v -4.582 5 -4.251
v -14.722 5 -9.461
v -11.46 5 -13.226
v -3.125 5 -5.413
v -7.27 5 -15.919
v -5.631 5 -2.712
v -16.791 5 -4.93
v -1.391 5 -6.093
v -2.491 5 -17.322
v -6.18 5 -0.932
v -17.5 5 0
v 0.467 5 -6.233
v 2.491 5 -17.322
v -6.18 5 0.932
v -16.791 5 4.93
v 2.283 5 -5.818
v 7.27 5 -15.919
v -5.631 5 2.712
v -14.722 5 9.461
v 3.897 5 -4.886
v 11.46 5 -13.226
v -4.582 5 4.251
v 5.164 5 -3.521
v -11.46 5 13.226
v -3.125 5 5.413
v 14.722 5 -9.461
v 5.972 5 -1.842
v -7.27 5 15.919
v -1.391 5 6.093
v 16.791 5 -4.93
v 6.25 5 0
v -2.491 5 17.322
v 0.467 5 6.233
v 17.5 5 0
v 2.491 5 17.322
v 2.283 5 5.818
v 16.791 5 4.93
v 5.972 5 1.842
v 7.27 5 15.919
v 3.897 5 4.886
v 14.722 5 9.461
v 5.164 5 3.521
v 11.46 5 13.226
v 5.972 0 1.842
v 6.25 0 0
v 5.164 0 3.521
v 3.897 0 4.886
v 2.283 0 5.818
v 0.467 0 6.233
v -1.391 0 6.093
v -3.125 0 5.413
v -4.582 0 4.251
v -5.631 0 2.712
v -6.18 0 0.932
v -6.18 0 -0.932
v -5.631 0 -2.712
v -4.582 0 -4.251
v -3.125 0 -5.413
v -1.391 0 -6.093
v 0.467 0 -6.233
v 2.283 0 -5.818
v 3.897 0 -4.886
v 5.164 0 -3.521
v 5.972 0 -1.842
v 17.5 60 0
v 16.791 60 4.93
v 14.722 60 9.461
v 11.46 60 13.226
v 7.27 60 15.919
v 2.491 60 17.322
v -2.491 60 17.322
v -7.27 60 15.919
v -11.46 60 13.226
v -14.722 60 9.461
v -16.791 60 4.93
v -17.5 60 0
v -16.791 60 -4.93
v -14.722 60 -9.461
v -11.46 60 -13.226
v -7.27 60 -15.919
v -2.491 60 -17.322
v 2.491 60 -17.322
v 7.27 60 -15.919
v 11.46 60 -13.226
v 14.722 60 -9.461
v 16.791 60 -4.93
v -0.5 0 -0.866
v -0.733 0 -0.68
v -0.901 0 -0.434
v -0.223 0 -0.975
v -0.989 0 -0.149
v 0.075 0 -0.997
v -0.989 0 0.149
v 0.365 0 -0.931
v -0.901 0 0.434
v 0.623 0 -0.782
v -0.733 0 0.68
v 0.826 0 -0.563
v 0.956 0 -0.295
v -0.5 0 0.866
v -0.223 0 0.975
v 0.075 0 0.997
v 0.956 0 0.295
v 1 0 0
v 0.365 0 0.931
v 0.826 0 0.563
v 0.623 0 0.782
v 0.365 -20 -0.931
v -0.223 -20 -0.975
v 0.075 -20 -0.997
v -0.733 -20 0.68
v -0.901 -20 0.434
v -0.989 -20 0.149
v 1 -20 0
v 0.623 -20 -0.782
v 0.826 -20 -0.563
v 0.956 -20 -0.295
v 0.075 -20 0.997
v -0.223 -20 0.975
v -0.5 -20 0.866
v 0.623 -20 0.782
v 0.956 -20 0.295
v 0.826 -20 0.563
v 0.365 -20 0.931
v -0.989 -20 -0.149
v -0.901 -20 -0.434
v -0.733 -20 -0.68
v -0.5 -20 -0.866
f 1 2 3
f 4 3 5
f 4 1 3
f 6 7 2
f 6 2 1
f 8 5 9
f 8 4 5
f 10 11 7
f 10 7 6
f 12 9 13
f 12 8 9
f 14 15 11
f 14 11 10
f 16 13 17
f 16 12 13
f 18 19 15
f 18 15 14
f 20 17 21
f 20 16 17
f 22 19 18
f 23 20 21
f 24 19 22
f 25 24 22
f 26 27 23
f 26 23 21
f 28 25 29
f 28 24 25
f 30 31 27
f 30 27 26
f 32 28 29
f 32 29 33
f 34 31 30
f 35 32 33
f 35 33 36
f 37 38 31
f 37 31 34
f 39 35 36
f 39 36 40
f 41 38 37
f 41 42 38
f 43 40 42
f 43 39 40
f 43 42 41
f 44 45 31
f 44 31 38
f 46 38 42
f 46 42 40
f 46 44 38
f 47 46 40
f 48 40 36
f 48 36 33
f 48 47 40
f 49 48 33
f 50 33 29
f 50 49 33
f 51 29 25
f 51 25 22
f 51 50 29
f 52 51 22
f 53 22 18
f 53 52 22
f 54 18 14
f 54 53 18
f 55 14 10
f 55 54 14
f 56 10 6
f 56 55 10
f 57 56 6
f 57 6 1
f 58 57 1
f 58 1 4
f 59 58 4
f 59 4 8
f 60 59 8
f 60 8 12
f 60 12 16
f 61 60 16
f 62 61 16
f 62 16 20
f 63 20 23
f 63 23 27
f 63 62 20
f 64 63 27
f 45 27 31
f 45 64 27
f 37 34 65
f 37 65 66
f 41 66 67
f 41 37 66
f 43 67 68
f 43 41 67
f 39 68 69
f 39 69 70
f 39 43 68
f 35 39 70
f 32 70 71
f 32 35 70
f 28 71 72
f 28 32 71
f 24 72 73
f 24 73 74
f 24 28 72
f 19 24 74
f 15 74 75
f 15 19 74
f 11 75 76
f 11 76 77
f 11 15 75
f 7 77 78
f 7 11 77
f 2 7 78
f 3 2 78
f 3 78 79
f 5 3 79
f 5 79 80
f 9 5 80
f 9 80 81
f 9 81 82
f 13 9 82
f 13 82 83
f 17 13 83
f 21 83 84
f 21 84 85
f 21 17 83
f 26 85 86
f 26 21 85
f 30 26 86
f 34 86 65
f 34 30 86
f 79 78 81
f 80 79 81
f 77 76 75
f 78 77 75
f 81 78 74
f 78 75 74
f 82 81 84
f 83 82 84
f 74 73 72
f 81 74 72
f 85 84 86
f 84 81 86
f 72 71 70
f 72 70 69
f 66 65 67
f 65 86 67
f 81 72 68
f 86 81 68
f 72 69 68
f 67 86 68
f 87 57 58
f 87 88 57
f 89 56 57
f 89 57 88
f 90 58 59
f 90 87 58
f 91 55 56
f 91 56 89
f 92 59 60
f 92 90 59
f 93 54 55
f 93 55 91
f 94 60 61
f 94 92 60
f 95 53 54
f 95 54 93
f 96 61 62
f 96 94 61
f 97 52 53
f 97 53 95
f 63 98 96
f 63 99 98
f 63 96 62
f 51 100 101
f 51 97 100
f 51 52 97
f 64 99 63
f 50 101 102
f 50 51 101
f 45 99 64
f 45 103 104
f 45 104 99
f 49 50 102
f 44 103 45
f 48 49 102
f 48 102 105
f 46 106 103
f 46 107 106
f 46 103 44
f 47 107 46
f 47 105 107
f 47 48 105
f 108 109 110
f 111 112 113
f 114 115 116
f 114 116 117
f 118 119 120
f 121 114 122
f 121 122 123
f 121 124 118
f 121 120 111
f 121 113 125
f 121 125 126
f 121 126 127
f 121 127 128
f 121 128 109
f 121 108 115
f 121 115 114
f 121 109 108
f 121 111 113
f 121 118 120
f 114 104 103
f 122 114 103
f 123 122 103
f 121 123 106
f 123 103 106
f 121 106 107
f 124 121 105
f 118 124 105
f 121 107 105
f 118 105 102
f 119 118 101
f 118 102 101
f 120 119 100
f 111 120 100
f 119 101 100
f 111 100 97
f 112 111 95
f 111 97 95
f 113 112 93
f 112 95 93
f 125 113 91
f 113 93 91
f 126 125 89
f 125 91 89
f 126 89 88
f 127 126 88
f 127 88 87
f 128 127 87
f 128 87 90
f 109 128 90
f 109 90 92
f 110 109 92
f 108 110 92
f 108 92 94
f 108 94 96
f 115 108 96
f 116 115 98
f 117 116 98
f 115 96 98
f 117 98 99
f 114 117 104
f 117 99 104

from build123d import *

# Parameters (mm, degrees)
F0_R     = 1
F1_DEPTH = 20
F2_R     = 6.25
F3_DEPTH = 5
F5_R     = 17.5
F6_DEPTH = 55


with BuildPart() as f1:
    # F0 (on Front) → F1 (new body)
    with BuildSketch(Plane.XZ):
        Circle(F0_R)
    extrude(amount=F1_DEPTH)

    # F2 (on Front) → F3 (join)
    with BuildSketch(Plane.XZ):
        Circle(F2_R)
    extrude(amount=-F3_DEPTH)

    # F5 (on offset) → F6 (join)
    with BuildSketch(Plane.XZ.offset(-5)):
        Circle(F5_R)
    extrude(amount=-F6_DEPTH)


solid = f1.part
